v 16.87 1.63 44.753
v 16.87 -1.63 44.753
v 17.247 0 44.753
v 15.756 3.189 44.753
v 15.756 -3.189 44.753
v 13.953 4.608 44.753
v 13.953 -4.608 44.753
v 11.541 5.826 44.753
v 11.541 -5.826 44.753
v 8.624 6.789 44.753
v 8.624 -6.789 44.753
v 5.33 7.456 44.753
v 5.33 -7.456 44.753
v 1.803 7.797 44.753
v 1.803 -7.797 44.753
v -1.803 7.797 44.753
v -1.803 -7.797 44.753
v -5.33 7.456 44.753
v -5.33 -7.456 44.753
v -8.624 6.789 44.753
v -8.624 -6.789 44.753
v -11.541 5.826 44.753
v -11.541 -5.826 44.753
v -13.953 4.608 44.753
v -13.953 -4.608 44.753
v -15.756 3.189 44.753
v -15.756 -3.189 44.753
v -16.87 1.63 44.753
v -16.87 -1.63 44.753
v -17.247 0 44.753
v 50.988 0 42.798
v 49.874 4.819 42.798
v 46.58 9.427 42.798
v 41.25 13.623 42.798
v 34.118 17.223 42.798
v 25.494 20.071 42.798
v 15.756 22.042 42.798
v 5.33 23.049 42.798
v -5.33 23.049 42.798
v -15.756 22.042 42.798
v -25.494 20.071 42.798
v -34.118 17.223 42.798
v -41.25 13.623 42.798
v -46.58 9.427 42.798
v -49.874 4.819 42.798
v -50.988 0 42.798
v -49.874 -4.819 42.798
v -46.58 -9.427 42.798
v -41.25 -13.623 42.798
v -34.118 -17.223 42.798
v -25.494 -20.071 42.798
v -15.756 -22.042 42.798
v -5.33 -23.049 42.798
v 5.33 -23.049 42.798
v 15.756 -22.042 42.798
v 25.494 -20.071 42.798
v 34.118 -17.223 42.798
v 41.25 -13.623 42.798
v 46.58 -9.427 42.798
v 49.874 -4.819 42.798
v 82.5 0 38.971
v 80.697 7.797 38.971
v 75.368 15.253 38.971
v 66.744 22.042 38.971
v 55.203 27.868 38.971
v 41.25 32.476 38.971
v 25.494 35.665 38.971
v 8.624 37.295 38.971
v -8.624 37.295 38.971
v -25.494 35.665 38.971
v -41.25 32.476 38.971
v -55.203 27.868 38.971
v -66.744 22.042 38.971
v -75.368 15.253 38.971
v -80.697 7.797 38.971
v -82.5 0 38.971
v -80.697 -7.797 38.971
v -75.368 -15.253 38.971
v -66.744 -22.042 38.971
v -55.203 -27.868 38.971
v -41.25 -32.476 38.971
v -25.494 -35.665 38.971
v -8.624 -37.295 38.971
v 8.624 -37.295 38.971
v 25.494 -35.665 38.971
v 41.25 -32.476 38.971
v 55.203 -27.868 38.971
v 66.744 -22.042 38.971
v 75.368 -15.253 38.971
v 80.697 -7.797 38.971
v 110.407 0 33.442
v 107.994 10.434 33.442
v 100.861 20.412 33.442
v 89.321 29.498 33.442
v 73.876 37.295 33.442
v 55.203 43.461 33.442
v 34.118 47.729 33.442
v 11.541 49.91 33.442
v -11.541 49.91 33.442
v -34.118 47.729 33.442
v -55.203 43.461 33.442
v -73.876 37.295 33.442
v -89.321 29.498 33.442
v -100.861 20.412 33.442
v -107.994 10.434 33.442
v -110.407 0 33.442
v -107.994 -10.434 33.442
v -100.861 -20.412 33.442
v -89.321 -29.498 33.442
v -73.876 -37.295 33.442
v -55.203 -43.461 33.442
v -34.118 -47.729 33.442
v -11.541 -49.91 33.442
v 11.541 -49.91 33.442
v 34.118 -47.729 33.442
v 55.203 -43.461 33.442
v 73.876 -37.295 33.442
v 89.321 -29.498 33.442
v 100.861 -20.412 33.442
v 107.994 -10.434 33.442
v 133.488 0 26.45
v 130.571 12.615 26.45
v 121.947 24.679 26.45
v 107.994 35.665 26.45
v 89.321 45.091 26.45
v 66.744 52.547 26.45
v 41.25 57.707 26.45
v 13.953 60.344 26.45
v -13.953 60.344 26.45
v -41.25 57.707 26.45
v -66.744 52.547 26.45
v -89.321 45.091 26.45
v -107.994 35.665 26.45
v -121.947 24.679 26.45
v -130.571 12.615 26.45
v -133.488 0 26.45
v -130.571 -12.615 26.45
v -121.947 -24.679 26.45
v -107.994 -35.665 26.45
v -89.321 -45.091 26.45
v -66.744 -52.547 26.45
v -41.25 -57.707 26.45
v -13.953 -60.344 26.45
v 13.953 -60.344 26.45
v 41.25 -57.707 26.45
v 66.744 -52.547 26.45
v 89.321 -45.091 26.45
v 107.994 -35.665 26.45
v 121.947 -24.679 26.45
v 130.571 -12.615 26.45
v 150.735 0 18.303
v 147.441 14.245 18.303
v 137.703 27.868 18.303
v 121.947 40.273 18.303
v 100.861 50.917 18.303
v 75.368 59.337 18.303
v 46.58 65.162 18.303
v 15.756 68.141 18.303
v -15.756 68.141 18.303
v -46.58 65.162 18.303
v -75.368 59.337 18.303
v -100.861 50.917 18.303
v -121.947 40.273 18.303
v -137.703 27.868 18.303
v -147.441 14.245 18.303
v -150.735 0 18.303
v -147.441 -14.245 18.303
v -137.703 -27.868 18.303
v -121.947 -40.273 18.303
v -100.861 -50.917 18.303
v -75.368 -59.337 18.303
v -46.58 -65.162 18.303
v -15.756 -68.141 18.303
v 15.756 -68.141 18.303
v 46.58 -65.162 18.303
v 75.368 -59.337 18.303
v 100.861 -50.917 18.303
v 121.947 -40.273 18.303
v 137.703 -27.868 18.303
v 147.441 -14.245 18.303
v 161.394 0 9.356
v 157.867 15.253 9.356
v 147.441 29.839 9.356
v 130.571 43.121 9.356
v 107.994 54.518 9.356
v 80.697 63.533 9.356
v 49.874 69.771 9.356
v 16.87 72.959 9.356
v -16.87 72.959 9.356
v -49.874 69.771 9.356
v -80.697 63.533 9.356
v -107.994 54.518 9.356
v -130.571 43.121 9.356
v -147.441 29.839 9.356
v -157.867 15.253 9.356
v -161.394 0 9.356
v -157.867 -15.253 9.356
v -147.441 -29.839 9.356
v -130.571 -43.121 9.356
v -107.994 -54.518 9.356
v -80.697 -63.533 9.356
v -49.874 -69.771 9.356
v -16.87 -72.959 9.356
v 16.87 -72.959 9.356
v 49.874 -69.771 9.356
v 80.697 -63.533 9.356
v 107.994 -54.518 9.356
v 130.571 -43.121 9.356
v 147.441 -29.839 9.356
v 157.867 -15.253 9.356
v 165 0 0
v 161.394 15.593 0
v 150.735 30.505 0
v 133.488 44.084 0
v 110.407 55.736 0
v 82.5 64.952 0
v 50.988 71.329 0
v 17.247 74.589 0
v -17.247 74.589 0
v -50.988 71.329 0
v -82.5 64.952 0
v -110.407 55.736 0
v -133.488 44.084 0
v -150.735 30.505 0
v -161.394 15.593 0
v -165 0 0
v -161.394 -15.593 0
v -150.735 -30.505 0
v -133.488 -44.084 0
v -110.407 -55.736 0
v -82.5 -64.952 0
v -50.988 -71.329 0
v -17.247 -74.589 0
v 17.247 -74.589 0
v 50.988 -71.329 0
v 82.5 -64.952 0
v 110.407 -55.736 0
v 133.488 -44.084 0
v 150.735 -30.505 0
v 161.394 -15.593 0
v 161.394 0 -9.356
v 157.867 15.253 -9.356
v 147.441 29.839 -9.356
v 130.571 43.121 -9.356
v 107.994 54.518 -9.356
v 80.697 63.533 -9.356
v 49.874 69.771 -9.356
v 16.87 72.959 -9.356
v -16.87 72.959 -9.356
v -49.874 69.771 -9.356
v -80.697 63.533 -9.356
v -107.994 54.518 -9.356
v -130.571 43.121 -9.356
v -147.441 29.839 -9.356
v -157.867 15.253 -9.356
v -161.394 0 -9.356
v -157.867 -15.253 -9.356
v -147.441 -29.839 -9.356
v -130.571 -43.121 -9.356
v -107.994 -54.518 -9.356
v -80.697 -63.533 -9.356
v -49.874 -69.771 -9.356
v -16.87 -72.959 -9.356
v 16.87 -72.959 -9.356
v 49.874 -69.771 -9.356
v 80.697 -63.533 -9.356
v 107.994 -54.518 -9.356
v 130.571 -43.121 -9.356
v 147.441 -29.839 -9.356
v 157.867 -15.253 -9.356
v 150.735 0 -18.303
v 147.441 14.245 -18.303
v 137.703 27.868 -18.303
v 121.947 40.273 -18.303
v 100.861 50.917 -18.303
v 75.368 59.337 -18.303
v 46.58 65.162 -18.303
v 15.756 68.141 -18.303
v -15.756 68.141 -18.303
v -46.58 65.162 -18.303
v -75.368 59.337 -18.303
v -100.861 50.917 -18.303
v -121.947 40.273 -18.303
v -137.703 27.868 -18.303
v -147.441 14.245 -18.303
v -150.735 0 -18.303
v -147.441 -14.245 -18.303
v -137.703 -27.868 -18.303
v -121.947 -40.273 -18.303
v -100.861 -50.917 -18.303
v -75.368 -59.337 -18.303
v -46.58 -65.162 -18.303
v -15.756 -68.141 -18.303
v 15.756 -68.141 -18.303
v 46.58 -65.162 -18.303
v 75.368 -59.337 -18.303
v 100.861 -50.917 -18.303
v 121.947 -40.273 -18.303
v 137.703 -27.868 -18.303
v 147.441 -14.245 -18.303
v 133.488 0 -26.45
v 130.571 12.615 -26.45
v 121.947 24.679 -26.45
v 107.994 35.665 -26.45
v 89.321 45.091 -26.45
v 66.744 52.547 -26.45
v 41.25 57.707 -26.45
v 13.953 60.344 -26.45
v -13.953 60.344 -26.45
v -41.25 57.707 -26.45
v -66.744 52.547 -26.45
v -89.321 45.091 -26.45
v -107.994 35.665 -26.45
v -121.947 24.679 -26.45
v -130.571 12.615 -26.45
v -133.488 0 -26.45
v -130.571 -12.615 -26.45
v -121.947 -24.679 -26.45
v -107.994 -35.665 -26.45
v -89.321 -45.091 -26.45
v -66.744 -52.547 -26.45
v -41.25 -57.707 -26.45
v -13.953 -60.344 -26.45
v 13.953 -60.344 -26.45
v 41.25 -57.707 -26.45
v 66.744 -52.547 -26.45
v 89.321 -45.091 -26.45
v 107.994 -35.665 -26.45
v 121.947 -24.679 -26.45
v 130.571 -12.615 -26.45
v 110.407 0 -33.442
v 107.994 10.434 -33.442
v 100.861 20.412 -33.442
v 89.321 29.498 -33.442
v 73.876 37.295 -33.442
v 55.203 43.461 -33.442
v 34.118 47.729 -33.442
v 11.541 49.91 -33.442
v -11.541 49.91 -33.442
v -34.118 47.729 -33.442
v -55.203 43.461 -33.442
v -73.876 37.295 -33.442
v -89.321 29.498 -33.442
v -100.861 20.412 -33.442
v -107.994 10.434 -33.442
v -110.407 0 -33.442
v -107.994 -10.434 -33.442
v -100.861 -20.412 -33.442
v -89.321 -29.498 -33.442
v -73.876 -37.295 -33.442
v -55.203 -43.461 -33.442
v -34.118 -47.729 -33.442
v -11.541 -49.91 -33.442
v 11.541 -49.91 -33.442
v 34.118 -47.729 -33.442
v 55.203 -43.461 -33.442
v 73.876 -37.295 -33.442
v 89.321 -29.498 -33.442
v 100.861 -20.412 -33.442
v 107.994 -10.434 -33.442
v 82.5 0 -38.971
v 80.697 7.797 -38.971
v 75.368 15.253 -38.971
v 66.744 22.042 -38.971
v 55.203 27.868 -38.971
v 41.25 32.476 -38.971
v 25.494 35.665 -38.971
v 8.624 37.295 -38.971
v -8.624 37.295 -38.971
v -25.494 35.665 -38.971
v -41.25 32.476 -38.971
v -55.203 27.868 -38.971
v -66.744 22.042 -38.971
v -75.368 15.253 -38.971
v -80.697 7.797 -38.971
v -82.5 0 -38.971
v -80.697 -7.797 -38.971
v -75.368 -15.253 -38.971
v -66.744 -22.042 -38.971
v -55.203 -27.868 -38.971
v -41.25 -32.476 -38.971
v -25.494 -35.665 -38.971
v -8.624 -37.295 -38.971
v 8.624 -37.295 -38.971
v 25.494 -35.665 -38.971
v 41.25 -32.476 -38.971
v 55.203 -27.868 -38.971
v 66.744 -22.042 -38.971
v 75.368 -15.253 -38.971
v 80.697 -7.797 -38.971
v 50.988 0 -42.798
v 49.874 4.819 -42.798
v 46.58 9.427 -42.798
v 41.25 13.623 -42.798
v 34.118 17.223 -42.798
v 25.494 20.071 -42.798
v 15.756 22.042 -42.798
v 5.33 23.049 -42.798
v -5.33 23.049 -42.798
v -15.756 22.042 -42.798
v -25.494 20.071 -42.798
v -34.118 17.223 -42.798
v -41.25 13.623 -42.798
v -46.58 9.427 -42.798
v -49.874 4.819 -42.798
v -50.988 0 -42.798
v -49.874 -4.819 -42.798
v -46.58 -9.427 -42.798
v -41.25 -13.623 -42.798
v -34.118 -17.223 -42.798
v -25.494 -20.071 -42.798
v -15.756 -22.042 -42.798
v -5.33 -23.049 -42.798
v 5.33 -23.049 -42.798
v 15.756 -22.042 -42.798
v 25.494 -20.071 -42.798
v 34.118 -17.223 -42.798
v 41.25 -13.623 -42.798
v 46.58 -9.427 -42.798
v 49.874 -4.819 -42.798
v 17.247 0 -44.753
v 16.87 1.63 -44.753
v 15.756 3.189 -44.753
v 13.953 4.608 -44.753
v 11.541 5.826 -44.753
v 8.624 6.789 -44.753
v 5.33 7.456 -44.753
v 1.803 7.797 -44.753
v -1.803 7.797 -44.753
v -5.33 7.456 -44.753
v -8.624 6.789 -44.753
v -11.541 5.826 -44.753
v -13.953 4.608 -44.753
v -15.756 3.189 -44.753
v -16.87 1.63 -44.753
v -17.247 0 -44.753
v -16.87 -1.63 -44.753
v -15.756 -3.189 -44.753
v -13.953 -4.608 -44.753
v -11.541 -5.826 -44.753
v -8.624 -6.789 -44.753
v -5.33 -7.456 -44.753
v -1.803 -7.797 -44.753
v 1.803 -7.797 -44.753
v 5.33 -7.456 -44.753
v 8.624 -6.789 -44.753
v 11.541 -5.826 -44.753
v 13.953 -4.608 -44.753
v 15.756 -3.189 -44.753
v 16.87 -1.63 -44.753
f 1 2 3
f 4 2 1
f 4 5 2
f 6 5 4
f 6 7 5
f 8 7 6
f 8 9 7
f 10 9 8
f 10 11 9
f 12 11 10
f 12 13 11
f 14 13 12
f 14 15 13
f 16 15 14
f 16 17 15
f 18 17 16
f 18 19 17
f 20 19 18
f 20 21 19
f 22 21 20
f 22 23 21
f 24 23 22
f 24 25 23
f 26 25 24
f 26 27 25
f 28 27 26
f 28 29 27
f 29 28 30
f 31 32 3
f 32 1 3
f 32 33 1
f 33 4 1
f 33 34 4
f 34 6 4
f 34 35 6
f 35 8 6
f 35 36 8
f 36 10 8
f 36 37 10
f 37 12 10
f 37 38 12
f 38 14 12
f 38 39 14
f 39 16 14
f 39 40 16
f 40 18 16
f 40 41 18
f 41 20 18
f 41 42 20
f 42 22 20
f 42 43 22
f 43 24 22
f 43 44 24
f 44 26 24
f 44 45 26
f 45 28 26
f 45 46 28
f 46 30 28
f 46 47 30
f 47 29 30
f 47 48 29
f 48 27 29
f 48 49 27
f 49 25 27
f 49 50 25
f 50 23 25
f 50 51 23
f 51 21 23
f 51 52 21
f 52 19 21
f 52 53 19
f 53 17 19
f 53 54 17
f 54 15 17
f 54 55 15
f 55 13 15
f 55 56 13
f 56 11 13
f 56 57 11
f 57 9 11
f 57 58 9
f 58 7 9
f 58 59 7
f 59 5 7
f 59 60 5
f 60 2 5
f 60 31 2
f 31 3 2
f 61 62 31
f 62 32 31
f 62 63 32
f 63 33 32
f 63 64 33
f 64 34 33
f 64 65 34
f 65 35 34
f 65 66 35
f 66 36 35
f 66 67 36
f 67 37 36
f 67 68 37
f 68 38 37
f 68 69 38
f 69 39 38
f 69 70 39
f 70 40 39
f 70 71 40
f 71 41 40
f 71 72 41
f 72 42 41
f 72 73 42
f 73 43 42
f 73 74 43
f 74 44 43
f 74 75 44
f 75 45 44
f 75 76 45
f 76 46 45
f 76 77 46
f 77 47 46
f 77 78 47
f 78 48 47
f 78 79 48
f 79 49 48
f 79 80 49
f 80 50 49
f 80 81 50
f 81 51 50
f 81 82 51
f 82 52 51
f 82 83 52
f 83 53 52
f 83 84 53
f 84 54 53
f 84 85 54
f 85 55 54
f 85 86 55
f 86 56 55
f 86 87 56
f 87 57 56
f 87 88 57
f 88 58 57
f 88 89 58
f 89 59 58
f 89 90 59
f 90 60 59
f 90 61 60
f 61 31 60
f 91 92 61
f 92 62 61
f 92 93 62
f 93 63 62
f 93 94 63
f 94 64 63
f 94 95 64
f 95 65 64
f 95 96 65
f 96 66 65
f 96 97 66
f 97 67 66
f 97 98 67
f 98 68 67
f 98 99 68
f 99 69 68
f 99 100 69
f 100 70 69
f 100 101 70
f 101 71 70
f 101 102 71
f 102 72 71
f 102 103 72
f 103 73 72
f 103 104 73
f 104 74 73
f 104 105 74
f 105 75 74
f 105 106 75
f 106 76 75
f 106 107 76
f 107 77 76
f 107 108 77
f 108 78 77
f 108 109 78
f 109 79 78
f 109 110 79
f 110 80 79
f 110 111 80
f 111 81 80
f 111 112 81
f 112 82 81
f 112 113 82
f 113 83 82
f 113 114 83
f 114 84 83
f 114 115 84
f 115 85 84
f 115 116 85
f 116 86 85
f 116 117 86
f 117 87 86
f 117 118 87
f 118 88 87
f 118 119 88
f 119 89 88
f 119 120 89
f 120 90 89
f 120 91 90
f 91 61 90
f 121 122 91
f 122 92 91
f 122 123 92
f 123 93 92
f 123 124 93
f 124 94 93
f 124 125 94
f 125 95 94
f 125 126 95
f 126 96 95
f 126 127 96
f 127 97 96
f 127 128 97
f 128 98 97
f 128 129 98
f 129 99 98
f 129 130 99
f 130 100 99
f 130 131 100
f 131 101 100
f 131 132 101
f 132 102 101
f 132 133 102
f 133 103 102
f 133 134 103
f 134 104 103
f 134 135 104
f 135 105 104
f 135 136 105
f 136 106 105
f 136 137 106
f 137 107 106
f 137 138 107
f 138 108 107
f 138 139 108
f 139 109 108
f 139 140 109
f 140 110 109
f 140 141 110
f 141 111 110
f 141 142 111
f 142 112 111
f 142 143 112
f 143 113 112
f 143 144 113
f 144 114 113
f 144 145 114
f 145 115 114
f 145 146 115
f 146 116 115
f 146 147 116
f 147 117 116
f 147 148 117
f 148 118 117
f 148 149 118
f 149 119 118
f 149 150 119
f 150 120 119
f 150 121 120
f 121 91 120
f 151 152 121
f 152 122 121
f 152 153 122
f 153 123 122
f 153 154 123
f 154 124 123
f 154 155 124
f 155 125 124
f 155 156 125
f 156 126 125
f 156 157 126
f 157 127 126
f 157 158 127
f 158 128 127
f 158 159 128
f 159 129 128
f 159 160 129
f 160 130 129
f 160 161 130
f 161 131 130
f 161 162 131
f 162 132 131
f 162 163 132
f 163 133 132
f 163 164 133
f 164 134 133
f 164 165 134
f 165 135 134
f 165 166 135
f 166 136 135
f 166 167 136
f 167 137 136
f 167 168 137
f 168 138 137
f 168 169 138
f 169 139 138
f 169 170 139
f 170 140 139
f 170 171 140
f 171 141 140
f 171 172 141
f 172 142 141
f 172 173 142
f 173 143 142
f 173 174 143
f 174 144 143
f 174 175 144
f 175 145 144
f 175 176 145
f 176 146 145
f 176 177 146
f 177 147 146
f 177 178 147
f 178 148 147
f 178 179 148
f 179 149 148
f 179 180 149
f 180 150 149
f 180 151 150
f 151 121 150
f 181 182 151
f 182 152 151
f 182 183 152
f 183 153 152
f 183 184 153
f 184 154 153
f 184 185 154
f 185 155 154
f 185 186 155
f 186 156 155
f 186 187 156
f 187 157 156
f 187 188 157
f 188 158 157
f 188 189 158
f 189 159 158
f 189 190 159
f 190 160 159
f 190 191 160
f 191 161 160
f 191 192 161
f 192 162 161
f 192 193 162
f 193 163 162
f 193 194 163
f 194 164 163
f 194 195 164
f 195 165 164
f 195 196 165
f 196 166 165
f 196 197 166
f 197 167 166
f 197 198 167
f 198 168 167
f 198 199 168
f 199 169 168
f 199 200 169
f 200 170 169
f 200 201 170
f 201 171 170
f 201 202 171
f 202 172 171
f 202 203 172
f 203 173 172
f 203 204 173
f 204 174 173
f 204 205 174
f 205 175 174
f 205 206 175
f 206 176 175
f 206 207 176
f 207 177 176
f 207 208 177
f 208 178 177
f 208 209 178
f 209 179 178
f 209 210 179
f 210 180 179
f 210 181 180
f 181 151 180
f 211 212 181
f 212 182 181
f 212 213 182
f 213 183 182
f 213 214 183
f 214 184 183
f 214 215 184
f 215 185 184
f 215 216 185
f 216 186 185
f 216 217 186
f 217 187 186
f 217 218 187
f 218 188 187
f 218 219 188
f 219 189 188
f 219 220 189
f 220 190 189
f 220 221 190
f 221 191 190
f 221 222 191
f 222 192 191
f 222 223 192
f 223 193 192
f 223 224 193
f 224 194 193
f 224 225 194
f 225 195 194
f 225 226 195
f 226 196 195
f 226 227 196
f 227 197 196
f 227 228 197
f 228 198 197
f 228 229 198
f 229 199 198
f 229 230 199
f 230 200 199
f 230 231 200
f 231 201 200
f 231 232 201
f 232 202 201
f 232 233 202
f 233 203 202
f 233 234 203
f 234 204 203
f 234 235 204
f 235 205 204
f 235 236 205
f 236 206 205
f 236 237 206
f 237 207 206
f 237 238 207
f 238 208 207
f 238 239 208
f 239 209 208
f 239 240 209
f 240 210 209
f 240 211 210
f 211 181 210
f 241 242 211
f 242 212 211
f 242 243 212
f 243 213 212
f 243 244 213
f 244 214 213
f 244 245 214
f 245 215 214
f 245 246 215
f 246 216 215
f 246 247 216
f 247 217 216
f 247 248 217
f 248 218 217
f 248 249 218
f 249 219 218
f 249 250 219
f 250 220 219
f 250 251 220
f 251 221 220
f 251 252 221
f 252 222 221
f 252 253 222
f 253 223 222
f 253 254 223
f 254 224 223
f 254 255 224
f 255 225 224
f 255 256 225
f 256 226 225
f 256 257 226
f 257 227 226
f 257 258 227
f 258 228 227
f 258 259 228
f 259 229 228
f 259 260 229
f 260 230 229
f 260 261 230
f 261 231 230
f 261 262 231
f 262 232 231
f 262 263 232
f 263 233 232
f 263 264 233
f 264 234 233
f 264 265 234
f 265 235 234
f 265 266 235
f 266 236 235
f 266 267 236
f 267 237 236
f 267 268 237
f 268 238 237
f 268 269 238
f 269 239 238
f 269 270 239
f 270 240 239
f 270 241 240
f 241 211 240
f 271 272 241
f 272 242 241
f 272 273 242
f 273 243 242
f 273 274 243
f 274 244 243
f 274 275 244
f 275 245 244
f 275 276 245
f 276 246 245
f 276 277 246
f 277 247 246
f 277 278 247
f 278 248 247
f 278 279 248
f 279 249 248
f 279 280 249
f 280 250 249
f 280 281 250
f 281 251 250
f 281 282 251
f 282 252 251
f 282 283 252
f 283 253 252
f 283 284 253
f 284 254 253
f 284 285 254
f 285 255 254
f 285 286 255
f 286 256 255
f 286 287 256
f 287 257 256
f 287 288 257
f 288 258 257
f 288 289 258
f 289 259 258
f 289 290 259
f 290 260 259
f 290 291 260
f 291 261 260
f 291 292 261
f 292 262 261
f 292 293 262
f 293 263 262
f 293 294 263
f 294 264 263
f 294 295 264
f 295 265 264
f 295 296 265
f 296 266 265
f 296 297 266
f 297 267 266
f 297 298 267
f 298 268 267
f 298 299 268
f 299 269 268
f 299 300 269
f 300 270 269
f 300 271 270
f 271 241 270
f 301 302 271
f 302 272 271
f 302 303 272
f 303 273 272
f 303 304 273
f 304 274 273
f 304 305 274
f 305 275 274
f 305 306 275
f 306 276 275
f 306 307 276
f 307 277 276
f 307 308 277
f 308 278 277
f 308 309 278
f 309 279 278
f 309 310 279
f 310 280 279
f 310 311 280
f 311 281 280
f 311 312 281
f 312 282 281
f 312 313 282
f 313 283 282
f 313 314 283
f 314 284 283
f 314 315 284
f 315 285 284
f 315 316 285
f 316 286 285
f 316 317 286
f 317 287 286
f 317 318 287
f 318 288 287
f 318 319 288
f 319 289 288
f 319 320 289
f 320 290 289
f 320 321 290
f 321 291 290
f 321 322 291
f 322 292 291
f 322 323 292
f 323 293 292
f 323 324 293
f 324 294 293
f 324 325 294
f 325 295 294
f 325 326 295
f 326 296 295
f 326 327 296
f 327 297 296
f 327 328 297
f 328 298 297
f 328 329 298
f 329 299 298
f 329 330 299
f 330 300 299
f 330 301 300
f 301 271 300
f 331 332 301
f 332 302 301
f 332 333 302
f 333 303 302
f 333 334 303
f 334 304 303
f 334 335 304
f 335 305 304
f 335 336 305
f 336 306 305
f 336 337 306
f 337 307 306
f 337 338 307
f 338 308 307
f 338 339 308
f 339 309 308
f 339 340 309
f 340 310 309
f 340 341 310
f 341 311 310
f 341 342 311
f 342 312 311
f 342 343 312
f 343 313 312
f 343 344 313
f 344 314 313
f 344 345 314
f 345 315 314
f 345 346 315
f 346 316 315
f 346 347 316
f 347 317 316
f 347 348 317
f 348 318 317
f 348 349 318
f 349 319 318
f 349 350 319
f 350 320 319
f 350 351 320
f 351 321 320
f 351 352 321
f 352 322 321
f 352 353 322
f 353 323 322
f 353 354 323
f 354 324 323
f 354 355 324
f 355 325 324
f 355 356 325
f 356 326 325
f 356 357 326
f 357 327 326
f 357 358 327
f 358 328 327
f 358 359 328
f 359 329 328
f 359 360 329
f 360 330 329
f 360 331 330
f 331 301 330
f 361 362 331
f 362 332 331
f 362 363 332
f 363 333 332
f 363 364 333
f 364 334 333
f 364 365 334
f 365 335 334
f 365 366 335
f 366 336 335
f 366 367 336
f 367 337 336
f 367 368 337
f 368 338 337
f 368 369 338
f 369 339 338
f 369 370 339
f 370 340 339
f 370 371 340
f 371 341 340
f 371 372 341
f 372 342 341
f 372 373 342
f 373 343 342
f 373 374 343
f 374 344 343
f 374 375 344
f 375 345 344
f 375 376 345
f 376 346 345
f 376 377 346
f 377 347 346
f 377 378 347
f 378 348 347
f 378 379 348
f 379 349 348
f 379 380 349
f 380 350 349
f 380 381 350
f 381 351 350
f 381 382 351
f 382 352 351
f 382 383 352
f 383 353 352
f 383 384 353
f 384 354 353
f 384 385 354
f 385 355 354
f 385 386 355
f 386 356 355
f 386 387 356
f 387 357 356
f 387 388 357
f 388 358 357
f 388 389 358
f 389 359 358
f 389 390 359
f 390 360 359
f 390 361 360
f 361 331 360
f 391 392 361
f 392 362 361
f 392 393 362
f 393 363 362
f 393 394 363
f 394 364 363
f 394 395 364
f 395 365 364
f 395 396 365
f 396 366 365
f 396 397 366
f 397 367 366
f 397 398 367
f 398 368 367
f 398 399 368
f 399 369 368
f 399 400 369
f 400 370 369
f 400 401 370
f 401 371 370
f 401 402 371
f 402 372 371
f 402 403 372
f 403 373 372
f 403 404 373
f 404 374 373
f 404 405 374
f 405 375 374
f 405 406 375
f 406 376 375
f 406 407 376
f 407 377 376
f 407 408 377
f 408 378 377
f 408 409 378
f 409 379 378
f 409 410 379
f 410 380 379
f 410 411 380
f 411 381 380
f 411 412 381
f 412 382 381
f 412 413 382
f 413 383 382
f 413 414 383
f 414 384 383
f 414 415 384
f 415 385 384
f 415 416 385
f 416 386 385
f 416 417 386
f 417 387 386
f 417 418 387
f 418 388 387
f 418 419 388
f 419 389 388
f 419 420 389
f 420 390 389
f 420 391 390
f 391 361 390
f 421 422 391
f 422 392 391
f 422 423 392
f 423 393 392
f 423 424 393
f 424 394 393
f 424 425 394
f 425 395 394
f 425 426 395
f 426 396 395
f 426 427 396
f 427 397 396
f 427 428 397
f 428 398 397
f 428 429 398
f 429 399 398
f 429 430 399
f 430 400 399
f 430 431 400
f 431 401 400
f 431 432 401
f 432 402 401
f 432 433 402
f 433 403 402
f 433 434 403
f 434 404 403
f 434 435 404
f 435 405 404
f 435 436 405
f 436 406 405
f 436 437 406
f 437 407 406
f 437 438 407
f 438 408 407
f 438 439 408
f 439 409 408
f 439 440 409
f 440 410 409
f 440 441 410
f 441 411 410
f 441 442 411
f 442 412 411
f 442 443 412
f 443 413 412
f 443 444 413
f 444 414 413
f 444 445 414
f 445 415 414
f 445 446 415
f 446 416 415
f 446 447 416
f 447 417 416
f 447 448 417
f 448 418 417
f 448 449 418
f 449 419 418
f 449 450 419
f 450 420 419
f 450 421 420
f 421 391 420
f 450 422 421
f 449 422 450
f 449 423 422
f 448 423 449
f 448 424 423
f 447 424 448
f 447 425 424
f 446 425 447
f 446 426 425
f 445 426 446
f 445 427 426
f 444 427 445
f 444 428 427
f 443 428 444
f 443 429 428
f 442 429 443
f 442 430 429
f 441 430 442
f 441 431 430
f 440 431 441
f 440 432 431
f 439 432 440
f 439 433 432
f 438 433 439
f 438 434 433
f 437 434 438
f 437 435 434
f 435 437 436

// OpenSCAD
// Generated by SolidPython 1.0.1 on 2020-07-29 00:46:49


scale(v = [11, 5, 3]) {
	sphere(r = 15);
}
/***********************************************
*********      SolidPython code:      **********
************************************************
 
# import packages: SolidPython
from solid import *
from solid.utils import *
from itertools import chain, combinations, permutations


class Resize:

    def __init__(self, scad_file):
        self.scad_file = scad_file
        #self.scad_file = import_scad(scad_file)
        # cone/cylinder param:
        self.r1 = 0
        self.r2 = 0
        self.h = 0
        # rectangular prism param:
        self.w = 0
        self.l = 0
        # ellipse param:
        self.r = 0

    # import OpenScad code (file name corresponds to shape)


    # classify shape + parameters
    def assign(self, param1, param2, param3):
        if self.scad_file == 'cone.scad':
            self.r1 = param1
            self.r2 = param2
            self.h = param3
        elif self.scad_file == 'cylinder.scad':
            self.r1 = param1
            self.r2 = param2
            self.h = param3
        elif self.scad_file == 'rectangularPrism.scad':
            self.h = param1
            self.l = param2
            self.w = param3
        else:
            self.r = param1
            self.h = param2

    # resize parameters
    def iterate(self):
        x = range(3, 20, 2)
        i = 1
        if self.scad_file == 'cone.scad':
            tempList = list(permutations(x, 2))
            for temp in tempList:
                param1 = temp[0]
                param2 = temp[1]
                filepath = 'produced_scad_files/' + 'cone' + str(param1) + '_' + str(param2) + '_' + '.scad'
                scad_render_to_file(cylinder(h=param1, r1=param2, r2=0), filepath)

        elif self.scad_file == 'cylinder.scad':
            tempList = list(permutations(x, 3))
            for temp in tempList:
                param1 = temp[0]
                param2 = temp[1]
                filepath = 'produced_scad_files/' + 'cylinder' + str(param1) + '_' + str(param2) + '_' + '.scad'
                scad_render_to_file(cylinder(h=param1, r1=param2, r2=param2), filepath)

        elif self.scad_file == 'rectangularPrism.scad':
            tempList = list(permutations(x, 3))
            for temp in tempList:
                param1 = temp[0]
                param2 = temp[1]
                param3 = temp[2]
                filepath = 'produced_scad_files/' + 'rectangularPrism' + str(param1) + '_' + str(param2) + '_' + str(
                    param3) + '.scad'
                scad_render_to_file(cube(size=(param1, param2, param3)), filepath)

        elif self.scad_file == 'ellipse.scad':
            tempList = list(permutations(x, 4))
            for temp in tempList:
                param1 = temp[0]
                param2 = temp[1]
                param3 = temp[2]
                param4 = temp[3]
                filepath = 'produced_scad_files/' + 'ellipse' + str(param1) + '_' + str(param2) + '_' + str(param3) + '_' + str(param4) + '.scad'
                scad_render_to_file(scale([param1, param2, param3])(sphere(r=param4)), filepath)

    def render_to_scadfile(self):
        scad_render_to_file(scad, 'example.scad') 
 
************************************************/
